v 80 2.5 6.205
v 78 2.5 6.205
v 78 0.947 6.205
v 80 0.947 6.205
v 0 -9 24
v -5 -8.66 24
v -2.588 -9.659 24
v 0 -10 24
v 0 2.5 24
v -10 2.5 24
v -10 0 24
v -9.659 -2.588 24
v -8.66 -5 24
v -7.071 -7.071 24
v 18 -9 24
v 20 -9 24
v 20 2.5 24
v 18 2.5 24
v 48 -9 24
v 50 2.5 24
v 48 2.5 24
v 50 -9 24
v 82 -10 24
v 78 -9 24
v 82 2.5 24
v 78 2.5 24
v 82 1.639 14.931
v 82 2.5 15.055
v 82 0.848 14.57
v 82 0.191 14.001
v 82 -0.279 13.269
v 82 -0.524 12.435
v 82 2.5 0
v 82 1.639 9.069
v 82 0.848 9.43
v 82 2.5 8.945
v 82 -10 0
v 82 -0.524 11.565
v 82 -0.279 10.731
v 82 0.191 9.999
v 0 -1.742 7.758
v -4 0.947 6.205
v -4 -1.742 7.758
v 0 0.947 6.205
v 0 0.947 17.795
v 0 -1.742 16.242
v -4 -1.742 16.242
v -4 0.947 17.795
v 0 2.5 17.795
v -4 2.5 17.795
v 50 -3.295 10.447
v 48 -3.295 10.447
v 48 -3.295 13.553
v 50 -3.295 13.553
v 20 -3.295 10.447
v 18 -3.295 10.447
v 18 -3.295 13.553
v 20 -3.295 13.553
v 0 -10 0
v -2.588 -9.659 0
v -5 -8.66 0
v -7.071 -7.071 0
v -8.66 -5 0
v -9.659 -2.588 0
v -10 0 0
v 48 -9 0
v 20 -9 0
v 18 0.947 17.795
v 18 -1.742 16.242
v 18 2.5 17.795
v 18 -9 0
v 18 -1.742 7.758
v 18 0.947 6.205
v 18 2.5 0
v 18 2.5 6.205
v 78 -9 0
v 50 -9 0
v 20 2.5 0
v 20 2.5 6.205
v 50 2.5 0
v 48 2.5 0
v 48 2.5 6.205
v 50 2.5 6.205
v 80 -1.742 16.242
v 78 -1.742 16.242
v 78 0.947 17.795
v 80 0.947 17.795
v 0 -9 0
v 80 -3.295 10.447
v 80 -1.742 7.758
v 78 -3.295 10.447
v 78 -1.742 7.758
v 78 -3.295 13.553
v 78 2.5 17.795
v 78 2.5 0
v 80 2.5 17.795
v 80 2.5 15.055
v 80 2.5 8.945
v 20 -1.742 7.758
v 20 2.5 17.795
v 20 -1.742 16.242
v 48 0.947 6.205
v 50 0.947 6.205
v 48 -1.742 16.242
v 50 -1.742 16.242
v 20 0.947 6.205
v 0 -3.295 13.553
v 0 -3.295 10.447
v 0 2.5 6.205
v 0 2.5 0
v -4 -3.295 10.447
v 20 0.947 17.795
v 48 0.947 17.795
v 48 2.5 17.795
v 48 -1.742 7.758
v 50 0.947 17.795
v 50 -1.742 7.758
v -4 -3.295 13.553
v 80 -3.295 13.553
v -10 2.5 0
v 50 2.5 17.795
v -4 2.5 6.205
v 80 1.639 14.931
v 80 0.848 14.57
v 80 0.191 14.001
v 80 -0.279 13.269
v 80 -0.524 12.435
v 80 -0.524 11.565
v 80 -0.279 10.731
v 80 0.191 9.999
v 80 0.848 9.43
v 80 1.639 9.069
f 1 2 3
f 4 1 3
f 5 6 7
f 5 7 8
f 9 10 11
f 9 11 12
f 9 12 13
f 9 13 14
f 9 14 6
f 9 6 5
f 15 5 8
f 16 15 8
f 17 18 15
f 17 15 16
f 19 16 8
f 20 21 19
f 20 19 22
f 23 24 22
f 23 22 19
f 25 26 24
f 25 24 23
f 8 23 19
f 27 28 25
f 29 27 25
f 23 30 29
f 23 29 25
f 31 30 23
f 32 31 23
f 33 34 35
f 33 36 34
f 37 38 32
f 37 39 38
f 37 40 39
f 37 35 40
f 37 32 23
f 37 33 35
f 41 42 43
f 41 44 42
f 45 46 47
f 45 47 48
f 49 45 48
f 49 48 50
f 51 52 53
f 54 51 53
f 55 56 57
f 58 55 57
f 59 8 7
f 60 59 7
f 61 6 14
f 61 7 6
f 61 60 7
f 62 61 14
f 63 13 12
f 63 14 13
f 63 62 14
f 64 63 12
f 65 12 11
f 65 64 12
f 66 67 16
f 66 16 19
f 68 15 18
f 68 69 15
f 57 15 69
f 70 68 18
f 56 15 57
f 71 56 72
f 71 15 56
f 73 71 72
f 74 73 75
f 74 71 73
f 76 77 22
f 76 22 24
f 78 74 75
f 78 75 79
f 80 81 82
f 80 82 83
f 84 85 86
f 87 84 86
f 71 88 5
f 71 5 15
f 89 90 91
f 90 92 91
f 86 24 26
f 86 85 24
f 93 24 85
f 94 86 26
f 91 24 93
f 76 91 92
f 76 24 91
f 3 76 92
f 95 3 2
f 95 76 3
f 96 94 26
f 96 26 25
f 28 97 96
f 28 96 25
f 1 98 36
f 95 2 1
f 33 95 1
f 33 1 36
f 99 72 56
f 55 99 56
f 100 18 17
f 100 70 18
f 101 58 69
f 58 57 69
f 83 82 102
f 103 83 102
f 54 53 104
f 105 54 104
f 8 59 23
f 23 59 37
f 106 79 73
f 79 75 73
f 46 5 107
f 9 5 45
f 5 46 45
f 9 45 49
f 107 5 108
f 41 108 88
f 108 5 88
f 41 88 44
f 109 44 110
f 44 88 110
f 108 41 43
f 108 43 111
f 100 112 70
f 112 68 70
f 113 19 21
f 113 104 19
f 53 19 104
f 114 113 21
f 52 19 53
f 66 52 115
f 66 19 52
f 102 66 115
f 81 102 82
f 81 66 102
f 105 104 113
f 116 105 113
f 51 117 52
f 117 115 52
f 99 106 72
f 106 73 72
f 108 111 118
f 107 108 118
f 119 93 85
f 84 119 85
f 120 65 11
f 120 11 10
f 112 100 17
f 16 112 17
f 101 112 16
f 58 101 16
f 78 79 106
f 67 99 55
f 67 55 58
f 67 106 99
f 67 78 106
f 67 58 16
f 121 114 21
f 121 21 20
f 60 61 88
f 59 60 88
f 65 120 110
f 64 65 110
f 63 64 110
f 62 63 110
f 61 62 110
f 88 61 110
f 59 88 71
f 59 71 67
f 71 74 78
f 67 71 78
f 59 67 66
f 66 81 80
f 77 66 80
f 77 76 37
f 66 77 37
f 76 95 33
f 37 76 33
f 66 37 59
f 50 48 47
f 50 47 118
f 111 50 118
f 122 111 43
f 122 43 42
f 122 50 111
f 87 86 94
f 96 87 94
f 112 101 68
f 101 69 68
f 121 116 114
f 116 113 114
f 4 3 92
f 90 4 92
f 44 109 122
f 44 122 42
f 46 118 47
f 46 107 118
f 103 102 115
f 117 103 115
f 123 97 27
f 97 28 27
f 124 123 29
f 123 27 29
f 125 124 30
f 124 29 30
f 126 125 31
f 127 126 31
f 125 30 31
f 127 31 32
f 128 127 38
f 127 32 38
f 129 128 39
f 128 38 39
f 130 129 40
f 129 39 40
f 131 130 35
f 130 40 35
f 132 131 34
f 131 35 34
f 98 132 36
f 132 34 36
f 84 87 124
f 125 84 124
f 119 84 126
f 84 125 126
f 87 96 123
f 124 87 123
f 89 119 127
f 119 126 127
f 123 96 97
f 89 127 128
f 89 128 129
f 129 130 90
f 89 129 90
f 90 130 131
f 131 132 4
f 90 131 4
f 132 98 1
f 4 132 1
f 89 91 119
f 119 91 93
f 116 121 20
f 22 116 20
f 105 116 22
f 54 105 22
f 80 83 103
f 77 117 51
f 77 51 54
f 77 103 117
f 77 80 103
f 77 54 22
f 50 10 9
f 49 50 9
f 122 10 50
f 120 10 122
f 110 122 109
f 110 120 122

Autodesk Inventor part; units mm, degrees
ref_plane "YZ Plane" through (0, 0, 0) normal (1, 0, 0) x (0, 1, 0)
ref_plane "XZ Plane" through (0, 0, 0) normal (0, 1, 0) x (-1, 0, 0)
ref_plane "XY Plane" through (0, 0, 0) normal (0, 0, 1) x (1, 0, 0)
sketch "스케치1" plane through (0, 0, 0) normal (0, 0, 1) x (1, 0, 0)
  arc A0 (-10, 0) -> (0, -10) centre (0, 0) ccw
  line L0 (-30.8853, 0) -> (100.8142, 0) projected
  line L1 (0, -14.9853) -> (0, 5.4142) projected
  line L2 (-10, 0) -> (-10, 2.5)
  line L3 (-10, 2.5) -> (0, 2.5)
  dimension "d1" = 20
  dimension "d2" = 2.5
sketch "스케치2" plane through (0, 0, 0) normal (0, 0, 1) x (1, 0, 0)
  line L0 (0, -14.9853) -> (0, 5.4142) projected
  line L1 (-30.8853, 0) -> (100.8142, 0) projected
  line L2 (-10, 2.5) -> (0, 2.5) projected
  line L3 (0, 2.5) -> (0, -9)
  line L4 (0, -9) -> (18, -9)
  line L5 (18, -9) -> (18, 2.5)
  line L6 (18, 2.5) -> (20, 2.5)
  line L7 (20, 2.5) -> (20, -9)
  line L8 (20, -9) -> (48, -9)
  line L9 (48, -9) -> (48, 2.5)
  line L10 (48, 2.5) -> (50, 2.5)
  line L11 (50, 2.5) -> (50, -9)
  line L12 (50, -9) -> (78, -9)
  line L13 (78, -9) -> (78, 2.5)
  line L14 (78, 2.5) -> (82, 2.5)
  line L15 (82, 2.5) -> (82, -9)
  line L16 (82, -9) -> (82, -10)
  line L17 (0, -10) -> (82, -10)
  point P0 (0, 0)
  dimension "d3" = 11.5
  dimension "d4" = 18
  dimension "d5" = 2
  dimension "d6" = 11.5
  dimension "d7" = 28
  dimension "d8" = 2
  dimension "d9" = 11.5
  dimension "d10" = 28
  dimension "d11" = 4
  dimension "d12" = 11.5
  dimension "d13" = 1
sketch "스케치3" plane through (0, 0, 0) normal (0, 0, 1) x (1, 0, 0)
  arc A0 (-10, 0) -> (0, -10) centre (0, 0) ccw projected
  line L0 (-10, 0) -> (-10, 2.5) projected
  line L1 (-10, 2.5) -> (0, 2.5) projected
  line L2 (0, -9) -> (18, -9) projected
  line L3 (0, -10) -> (82, -10) projected
  line L4 (18, -9) -> (18, 2.5) projected
  line L5 (18, 2.5) -> (20, 2.5) projected
  line L6 (20, 2.5) -> (20, -9) projected
  line L7 (20, -9) -> (48, -9) projected
  line L8 (48, -9) -> (48, 2.5) projected
  line L9 (50, 2.5) -> (50, -9) projected
  line L10 (48, 2.5) -> (50, 2.5) projected
  line L11 (50, -9) -> (78, -9) projected
  line L12 (78, -9) -> (78, 2.5) projected
  line L13 (78, 2.5) -> (82, 2.5) projected
  line L14 (82, 2.5) -> (82, -9) projected
extrude "돌출1" add sketch "스케치2" along normal blind 24 contours L0 L4 L5 L1 L7 L8 L9 L11 L12 L13 L15 L16 L17 | L5 L6 L7 L1 | L1 L13 L14 L15 | L9 L10 L11 L1
extrude "돌출2" add sketch "스케치1" along normal blind 24
sketch "스케치4" plane through (0, -9, 0) normal (1, 0, 0) x (0, 0, -1)
  point P0 (0, 9)
sketch "스케치5" plane through (0, -9, 0) normal (1, 0, 0) x (0, 0, -1)
  line L0 (-6.205, 11.5) -> (-6.205, 9.9472)
  line L1 (-6.205, 9.9472) -> (-7.7578, 7.2578)
  line L2 (-7.7578, 7.2578) -> (-10.4472, 5.705)
  line L3 (-10.4472, 5.705) -> (-13.5528, 5.705)
  line L4 (-13.5528, 5.705) -> (-16.2422, 7.2578)
  line L5 (-16.2422, 7.2578) -> (-17.795, 9.9472)
  line L6 (-17.795, 9.9472) -> (-17.795, 11.5)
  line L7 (0, 0) -> (-24, 0) projected
  line L8 (0, 11.5) -> (-24, 11.5) projected
  point P0 (0, 9)
  point P1 (-12, 11.5)
  point P2 (-12, 0)
  point P3 (-12, 11.5)
  dimension "d18" = 11.59
extrude "돌출3" cut sketch "스케치5" against normal blind 4
sketch "스케치6" plane through (0, -9, 0) normal (1, 0, 0) x (0, 0, -1)
  line L0 (-13.5528, 5.705) -> (-16.2422, 7.2578) projected
  line L1 (-10.4472, 5.705) -> (-13.5528, 5.705) projected
  line L2 (-7.7578, 7.2578) -> (-10.4472, 5.705) projected
  line L3 (-6.205, 9.9472) -> (-7.7578, 7.2578) projected
  line L4 (-6.205, 11.5) -> (-6.205, 9.9472) projected
  line L5 (-17.795, 11.5) -> (-6.205, 11.5) projected
  line L6 (-17.795, 9.9472) -> (-17.795, 11.5) projected
  line L7 (-16.2422, 7.2578) -> (-17.795, 9.9472) projected
  point P0 (0, 9)
extrude "돌출4" cut sketch "스케치6" along normal blind 80
sketch "스케치7" plane through (82, -10, 0) normal (1, 0, 0) x (0, 0, -1)
  point P0 (0, 10)
sketch "스케치8" plane through (80, -9, 0) normal (-1, 0, 0) x (0, 0, 1)
  line L0 (6.205, 11.5) -> (17.795, 11.5) projected
  line L1 (10.4472, 5.705) -> (7.7578, 7.2578) projected
  line L2 (13.5528, 5.705) -> (10.4472, 5.705) projected
  line L3 (16.2422, 7.2578) -> (13.5528, 5.705) projected
  line L4 (17.795, 9.9472) -> (16.2422, 7.2578) projected
  line L5 (17.795, 11.5) -> (17.795, 9.9472) projected
  line L6 (6.205, 11.5) -> (17.795, 11.5) projected
  line L7 (6.205, 9.9472) -> (6.205, 11.5) projected
  line L8 (7.7578, 7.2578) -> (6.205, 9.9472) projected
  point P0 (0, 9)
sketch "스케치9" plane through (82, -10, 0) normal (1, 0, 0) x (0, 0, -1)
  arc A0 (-15.055, 12.5) -> (-8.945, 12.5) centre (-12, 12.5) ccw
  line L0 (0, 12.5) -> (-24, 12.5) projected
  point P0 (0, 10)
extrude "돌출5" cut sketch "스케치9" against normal up to surface (2 mm away)
properties part number "Support"
